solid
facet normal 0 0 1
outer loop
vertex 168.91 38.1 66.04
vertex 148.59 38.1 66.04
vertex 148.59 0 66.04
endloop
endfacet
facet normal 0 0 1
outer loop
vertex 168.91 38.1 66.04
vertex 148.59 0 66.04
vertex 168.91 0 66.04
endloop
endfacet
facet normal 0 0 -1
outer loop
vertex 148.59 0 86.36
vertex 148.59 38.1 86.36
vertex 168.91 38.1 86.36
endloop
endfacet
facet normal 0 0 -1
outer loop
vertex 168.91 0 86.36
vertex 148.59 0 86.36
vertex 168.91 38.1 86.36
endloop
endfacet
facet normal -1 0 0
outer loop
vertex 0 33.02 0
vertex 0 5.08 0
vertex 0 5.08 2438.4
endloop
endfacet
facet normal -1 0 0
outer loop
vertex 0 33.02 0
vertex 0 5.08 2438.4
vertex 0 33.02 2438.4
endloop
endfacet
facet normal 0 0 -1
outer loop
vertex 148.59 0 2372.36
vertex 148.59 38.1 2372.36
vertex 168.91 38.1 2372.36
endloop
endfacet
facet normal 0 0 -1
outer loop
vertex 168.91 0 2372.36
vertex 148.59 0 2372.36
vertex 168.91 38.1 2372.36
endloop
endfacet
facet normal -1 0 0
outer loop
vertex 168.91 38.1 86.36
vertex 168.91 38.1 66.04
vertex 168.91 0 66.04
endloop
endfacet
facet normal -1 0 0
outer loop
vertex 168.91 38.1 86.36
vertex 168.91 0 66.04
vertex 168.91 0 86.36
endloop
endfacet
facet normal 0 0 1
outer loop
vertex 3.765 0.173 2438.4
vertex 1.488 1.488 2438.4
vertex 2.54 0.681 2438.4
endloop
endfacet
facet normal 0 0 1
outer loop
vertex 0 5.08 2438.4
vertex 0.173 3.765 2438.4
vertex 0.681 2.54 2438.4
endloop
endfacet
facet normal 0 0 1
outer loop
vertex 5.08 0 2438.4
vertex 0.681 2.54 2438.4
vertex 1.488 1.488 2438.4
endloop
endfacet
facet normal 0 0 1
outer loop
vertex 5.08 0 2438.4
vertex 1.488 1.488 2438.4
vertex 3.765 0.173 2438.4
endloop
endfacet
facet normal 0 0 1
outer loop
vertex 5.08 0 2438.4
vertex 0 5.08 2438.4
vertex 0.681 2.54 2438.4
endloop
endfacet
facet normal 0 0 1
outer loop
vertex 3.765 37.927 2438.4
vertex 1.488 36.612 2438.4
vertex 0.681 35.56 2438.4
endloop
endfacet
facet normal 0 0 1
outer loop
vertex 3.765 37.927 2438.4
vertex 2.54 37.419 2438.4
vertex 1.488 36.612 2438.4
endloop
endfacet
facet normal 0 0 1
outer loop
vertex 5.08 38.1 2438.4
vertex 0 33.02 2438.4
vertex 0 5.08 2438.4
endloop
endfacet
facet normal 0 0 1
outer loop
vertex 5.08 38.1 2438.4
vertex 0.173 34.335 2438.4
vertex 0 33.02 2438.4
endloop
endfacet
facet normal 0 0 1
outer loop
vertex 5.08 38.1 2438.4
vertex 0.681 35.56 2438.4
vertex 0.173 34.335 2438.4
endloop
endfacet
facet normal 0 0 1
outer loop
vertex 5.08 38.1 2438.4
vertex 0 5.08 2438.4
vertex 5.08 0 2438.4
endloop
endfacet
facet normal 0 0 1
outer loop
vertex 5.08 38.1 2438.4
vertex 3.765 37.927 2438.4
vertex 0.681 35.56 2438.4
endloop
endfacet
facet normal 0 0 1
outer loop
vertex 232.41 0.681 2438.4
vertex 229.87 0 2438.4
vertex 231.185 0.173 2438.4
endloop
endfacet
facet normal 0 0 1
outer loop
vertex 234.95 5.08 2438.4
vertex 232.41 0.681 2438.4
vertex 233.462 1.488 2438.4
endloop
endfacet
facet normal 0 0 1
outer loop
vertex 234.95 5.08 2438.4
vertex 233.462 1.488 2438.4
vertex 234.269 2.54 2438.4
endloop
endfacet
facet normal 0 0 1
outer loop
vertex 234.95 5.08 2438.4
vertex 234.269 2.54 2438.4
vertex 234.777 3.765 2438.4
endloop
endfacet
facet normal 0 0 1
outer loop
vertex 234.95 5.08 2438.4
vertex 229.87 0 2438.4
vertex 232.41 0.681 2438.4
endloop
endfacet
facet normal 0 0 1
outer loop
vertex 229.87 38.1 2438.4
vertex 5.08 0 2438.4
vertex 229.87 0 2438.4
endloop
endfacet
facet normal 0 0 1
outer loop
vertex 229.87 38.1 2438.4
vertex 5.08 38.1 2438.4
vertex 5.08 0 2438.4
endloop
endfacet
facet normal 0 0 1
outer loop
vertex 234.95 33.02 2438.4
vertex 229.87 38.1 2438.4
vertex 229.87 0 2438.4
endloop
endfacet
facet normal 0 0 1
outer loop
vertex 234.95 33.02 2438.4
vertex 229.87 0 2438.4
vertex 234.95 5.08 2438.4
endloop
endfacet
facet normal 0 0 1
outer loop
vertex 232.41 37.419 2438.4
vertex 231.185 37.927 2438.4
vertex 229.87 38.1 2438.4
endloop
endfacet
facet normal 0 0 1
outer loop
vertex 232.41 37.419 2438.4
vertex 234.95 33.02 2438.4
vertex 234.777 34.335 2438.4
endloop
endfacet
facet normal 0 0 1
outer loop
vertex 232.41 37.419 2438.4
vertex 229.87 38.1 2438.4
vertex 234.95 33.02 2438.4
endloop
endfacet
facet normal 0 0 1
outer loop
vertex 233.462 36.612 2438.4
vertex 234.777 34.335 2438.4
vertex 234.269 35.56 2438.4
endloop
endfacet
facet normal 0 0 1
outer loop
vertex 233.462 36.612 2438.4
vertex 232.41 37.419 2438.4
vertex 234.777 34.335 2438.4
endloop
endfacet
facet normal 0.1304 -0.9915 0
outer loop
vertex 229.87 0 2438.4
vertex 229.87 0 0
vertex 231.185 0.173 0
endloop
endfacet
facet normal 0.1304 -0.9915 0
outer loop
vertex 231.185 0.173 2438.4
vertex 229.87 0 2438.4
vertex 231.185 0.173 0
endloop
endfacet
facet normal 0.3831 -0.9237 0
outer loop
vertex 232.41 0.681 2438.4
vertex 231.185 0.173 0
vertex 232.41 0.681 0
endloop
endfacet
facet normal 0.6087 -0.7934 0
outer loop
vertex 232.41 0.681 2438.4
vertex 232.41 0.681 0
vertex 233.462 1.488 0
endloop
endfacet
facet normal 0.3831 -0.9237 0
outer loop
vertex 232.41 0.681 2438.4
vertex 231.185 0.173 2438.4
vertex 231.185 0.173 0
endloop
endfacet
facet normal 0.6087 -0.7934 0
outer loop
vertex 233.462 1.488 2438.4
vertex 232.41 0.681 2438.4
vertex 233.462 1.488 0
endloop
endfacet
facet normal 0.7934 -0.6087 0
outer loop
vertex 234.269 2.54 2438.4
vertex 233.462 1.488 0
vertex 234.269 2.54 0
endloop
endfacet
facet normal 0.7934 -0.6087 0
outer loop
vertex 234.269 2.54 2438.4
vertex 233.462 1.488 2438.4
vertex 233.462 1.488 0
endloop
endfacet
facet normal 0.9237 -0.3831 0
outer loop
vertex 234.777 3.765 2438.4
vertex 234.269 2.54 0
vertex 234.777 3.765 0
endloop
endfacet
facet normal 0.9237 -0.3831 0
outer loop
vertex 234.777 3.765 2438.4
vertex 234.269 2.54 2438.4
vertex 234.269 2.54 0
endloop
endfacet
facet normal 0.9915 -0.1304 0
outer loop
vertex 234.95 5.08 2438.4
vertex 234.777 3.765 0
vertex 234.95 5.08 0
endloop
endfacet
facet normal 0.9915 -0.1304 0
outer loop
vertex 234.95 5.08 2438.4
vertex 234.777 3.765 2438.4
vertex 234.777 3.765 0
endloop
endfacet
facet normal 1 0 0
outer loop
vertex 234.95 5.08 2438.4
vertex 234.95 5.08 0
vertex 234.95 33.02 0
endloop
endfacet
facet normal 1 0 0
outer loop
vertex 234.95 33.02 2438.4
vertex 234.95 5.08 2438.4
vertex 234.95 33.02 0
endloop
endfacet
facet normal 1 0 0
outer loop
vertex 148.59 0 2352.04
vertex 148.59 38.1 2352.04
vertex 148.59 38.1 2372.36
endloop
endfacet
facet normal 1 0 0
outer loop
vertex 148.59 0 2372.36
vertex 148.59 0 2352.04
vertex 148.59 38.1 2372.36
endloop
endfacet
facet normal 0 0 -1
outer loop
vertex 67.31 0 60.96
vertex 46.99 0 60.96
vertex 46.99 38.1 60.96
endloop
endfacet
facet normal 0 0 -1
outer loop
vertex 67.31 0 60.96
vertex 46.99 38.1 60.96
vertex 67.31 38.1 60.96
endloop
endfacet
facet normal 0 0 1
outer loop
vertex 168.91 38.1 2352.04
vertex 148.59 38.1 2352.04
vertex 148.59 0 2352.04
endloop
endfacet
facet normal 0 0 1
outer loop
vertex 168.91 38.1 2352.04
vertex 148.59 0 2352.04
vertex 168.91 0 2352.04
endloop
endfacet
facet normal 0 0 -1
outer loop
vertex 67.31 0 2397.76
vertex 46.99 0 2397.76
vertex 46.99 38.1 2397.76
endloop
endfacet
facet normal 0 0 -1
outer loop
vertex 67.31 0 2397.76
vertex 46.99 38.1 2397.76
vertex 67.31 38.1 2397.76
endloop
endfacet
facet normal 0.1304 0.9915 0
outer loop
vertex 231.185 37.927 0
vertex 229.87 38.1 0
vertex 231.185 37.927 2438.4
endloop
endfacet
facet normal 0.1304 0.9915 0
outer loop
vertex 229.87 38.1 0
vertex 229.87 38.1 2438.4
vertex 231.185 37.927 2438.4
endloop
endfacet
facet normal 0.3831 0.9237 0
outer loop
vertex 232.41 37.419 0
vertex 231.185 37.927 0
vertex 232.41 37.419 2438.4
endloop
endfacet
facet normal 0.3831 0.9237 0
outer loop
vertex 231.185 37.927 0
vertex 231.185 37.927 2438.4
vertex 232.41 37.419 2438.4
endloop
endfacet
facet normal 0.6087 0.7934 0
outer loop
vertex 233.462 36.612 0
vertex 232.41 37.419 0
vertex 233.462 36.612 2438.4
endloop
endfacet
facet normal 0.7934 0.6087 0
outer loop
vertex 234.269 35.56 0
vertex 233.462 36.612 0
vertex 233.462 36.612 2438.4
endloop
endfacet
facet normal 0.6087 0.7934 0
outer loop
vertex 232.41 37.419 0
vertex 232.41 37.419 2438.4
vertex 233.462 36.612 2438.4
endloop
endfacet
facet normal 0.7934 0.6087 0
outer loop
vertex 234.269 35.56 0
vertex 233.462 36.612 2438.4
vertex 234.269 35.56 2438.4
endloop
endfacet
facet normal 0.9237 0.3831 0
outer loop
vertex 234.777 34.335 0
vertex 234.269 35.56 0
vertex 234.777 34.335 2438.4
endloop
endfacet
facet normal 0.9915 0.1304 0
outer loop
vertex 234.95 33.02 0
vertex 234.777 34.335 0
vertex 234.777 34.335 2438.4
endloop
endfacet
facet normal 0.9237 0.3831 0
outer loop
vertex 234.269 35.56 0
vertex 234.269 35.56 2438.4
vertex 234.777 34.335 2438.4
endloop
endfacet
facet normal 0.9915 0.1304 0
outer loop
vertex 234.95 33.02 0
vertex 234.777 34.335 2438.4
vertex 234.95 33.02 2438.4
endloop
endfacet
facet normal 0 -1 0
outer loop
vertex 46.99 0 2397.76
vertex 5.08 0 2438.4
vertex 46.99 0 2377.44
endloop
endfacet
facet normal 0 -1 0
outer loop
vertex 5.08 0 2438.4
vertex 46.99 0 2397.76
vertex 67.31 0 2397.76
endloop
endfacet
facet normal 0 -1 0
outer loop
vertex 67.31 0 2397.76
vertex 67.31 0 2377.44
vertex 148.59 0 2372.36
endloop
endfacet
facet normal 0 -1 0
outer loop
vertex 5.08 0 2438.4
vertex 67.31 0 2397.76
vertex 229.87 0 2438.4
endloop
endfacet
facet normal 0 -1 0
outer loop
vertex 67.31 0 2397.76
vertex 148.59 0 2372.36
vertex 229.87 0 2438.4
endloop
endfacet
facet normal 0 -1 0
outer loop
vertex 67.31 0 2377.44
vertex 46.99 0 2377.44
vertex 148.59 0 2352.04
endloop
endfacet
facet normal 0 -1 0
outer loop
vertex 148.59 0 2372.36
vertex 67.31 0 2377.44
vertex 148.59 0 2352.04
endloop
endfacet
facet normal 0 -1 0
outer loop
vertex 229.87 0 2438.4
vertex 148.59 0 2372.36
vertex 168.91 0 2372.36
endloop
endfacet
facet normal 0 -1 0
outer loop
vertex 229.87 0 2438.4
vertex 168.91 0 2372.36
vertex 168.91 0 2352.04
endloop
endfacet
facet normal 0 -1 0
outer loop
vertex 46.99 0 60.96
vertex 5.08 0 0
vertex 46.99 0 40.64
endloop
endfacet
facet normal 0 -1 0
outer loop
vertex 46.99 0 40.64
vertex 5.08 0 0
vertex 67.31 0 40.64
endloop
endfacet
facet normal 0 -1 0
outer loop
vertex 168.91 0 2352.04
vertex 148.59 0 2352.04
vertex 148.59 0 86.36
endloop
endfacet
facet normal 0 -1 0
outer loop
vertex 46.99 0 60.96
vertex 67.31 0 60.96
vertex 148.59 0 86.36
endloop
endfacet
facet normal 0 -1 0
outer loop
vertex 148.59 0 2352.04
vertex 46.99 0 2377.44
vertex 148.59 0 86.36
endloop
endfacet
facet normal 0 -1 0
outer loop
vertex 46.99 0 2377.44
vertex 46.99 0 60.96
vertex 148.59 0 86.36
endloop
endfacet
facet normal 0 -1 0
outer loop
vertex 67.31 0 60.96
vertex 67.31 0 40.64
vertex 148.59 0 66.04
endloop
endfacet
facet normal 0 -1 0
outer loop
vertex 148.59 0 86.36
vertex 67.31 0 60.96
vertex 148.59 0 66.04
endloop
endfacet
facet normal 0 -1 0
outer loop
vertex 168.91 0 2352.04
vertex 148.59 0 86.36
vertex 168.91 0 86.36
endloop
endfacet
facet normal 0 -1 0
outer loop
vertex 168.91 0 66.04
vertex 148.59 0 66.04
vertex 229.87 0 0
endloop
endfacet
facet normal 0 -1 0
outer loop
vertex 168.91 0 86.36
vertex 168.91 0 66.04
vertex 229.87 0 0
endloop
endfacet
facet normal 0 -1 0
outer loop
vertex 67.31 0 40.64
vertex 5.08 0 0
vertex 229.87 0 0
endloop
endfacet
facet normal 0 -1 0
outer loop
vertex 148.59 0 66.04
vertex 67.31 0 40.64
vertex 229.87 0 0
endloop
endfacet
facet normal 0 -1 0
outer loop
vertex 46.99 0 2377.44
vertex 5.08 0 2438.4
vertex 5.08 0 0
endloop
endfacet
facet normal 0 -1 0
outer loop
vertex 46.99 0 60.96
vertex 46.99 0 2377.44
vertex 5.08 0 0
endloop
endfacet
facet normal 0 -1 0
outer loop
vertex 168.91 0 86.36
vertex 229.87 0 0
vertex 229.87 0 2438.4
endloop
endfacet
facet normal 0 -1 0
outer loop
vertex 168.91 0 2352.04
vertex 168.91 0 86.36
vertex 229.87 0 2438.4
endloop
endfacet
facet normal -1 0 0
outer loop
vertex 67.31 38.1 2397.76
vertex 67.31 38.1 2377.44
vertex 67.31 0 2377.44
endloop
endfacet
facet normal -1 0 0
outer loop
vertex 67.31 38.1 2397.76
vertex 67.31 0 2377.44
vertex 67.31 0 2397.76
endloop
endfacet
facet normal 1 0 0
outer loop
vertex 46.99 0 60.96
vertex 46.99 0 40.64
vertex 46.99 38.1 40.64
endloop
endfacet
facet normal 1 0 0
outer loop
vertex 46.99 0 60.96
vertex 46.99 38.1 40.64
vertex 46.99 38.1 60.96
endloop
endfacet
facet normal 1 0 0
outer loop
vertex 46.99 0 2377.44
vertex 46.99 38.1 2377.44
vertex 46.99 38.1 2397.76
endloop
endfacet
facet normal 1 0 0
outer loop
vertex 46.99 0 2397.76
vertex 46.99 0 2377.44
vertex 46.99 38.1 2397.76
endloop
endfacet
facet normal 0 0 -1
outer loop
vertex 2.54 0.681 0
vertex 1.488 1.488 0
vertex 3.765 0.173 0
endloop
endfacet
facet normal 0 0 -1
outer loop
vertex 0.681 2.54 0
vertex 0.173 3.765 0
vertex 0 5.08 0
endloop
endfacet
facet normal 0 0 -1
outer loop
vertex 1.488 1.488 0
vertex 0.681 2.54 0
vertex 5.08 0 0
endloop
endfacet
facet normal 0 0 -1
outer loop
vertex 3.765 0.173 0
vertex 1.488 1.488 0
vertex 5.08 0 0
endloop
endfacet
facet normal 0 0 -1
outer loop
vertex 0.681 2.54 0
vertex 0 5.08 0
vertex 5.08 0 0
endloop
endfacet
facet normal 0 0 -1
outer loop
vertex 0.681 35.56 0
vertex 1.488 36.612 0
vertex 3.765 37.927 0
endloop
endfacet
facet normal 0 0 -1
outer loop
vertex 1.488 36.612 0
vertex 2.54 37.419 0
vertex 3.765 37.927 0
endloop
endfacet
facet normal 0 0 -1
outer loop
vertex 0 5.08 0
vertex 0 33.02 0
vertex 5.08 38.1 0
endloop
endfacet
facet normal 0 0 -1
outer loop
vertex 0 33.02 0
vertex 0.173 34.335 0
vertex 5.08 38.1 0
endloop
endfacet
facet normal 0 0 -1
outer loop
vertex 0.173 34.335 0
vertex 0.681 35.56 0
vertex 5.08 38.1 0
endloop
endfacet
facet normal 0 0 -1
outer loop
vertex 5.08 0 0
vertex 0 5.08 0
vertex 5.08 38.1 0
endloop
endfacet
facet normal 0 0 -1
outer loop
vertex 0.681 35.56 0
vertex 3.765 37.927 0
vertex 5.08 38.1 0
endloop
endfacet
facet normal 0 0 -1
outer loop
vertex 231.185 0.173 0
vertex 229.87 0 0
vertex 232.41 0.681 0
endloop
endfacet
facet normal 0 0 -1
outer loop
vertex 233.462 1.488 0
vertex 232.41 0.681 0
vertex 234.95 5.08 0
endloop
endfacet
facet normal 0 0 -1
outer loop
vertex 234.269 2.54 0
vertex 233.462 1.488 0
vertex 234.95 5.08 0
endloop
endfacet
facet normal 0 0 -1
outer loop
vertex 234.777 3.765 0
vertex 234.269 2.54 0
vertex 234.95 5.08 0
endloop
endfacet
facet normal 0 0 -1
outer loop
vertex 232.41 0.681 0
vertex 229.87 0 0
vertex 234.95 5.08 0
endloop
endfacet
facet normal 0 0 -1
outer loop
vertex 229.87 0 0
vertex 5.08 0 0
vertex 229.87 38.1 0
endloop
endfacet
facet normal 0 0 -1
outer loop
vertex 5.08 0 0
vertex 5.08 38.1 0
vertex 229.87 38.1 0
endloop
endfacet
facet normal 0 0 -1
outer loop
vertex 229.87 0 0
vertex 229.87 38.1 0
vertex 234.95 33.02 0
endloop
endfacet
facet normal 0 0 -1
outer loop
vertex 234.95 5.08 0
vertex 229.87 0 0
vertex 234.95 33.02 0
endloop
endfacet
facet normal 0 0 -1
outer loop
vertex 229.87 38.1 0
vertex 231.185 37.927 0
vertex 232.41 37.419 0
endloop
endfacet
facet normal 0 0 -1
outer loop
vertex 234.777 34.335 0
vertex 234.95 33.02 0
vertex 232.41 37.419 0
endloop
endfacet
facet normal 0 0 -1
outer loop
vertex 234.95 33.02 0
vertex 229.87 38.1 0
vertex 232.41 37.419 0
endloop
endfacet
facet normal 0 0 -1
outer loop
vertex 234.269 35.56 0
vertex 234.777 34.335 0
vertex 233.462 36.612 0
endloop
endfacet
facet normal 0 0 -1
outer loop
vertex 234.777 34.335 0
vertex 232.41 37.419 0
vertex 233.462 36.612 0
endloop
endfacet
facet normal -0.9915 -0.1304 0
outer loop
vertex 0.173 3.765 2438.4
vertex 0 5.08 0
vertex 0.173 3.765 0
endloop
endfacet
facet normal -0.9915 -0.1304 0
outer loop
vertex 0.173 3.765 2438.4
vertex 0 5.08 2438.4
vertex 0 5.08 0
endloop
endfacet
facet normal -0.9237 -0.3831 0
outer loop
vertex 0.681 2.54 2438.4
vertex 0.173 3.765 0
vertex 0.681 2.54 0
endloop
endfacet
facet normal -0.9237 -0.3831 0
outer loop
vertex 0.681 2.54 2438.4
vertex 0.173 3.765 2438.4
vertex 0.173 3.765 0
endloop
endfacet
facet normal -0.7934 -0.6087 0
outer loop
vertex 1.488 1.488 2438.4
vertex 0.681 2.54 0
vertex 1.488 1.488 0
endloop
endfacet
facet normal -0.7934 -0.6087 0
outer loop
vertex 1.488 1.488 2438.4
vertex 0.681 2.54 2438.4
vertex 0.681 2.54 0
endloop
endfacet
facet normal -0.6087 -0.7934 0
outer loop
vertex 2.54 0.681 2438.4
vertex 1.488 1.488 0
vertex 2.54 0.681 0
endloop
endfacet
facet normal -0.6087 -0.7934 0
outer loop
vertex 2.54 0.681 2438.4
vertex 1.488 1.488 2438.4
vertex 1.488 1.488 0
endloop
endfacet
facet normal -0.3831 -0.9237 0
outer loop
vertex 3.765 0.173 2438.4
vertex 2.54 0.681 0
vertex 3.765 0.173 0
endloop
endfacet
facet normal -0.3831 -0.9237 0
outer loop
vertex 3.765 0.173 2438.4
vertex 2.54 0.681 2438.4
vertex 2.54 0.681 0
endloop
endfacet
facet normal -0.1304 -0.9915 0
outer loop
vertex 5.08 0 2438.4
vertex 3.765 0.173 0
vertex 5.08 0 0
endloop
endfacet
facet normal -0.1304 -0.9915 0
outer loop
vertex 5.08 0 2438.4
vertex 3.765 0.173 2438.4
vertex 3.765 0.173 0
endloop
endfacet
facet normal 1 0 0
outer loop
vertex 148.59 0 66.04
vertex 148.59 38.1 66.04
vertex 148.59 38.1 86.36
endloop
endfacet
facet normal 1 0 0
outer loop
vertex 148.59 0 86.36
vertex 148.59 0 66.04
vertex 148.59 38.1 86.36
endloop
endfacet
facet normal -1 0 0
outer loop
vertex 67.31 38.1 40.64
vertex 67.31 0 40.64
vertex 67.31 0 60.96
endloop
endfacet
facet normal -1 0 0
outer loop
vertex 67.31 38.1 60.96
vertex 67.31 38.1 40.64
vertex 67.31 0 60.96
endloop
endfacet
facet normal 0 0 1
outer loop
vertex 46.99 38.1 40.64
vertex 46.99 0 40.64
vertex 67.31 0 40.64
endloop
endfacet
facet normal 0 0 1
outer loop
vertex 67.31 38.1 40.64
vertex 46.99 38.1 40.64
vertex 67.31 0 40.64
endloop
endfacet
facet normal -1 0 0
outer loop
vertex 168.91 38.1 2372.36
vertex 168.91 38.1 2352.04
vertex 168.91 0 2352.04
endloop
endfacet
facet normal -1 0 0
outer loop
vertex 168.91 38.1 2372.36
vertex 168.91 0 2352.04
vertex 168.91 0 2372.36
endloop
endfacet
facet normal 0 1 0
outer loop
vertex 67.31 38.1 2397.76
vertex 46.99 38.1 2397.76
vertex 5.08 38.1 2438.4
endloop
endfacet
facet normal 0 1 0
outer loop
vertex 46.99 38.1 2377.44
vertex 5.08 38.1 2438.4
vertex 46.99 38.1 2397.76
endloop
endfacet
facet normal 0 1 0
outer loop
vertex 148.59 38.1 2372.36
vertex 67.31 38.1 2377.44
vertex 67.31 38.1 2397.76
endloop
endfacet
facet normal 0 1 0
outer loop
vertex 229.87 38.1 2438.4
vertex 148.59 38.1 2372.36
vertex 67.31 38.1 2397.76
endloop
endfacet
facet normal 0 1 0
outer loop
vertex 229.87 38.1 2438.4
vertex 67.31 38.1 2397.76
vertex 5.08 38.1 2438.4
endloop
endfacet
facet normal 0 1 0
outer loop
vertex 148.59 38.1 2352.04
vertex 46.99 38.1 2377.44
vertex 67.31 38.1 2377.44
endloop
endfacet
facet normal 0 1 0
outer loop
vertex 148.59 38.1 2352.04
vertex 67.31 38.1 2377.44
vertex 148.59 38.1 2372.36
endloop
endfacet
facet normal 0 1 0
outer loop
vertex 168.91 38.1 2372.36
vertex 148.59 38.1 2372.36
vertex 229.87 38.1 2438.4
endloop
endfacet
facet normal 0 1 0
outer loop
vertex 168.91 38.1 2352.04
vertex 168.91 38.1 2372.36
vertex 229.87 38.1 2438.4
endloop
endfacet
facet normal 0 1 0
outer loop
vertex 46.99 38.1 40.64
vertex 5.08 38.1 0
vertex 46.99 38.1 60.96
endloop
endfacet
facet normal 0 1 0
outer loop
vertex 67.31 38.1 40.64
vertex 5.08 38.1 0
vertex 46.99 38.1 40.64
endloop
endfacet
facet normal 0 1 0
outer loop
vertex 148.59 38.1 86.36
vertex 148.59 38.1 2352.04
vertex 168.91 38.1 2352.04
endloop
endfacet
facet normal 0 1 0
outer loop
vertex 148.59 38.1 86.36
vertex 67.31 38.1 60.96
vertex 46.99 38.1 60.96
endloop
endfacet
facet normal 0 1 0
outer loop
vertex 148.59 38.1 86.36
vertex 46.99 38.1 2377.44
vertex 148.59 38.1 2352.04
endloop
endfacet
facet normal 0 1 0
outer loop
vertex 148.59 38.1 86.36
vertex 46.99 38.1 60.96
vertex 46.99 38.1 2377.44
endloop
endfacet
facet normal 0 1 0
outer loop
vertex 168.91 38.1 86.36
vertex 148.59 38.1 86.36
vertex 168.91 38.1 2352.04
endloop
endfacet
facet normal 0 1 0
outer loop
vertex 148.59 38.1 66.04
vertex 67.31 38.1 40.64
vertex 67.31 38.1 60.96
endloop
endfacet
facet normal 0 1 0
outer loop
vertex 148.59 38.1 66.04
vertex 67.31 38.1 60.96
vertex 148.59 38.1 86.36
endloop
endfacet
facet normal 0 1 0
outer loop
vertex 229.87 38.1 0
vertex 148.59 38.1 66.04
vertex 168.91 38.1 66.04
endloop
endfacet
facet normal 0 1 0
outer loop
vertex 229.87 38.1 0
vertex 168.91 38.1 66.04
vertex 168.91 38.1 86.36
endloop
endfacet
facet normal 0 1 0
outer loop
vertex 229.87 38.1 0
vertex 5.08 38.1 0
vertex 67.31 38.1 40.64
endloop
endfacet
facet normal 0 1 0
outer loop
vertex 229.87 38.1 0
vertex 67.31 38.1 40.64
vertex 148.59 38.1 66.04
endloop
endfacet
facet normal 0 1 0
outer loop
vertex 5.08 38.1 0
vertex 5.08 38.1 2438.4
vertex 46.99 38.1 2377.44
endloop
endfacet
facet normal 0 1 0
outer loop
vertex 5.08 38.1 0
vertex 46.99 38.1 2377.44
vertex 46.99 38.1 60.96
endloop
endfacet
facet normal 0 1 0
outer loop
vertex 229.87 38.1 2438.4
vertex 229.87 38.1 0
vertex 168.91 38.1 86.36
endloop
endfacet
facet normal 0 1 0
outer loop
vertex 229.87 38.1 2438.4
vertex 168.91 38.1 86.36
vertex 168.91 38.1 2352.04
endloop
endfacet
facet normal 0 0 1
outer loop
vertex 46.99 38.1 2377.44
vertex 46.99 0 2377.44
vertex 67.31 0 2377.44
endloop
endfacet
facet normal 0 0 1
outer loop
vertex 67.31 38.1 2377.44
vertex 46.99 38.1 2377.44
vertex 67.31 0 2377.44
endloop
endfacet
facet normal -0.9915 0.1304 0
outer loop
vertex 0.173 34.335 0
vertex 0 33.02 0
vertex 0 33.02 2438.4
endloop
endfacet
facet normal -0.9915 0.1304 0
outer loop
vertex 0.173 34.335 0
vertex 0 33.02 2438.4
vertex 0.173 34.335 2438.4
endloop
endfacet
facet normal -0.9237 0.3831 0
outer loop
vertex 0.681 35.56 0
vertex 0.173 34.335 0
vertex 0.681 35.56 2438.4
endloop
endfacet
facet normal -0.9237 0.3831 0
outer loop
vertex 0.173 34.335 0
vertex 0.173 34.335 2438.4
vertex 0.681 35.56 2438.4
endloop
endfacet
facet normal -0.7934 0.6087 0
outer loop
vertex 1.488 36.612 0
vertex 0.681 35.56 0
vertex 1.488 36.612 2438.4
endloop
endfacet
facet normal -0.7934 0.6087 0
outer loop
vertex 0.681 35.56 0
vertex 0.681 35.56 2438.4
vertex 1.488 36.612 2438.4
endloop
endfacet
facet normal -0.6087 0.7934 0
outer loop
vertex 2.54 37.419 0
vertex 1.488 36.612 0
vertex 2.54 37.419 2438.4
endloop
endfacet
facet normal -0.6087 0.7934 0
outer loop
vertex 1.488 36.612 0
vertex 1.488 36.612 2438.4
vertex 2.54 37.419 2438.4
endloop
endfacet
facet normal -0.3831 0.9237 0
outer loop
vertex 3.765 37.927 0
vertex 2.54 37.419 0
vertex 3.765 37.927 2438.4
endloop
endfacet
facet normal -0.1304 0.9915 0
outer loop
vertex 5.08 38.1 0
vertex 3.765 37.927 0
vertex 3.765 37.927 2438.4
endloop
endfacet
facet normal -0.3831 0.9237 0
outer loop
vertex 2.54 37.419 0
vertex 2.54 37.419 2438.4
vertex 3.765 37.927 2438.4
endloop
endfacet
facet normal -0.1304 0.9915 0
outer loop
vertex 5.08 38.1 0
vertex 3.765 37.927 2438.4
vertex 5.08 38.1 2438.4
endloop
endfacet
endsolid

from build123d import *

# Parameters (mm, degrees)
F0_W     = 234.95
F0_H     = 38.1
F1_DEPTH = 2438.4
F2_W     = 20.32
F2_H     = 20.32
F3_DEPTH = 50.8
F4_R     = 5.08


with BuildPart() as f1:
    # F0 (on Top) → F1 (new body)
    with BuildSketch(Plane.XY):
        with Locations((117.475, 19.05)):
            Rectangle(F0_W, F0_H)
    extrude(amount=F1_DEPTH)

    # F2 (on face) → F3 (cut)
    with BuildSketch(Plane.XZ):
        with Locations((57.15, 2387.6)):
            Rectangle(F2_W, F2_H)
        with Locations((158.75, 2362.2)):
            Rectangle(F2_W, F2_H)
        with Locations((158.75, 76.2)):
            Rectangle(F2_W, F2_H)
        with Locations((57.15, 50.8)):
            Rectangle(F2_W, F2_H)
    extrude(amount=-F3_DEPTH, mode=Mode.SUBTRACT)

    # F4
    f4_edges = [f1.edges().sort_by_distance(p)[0] for p in [
        (0, 0, 1219.2),
        (234.95, 0, 1219.2),
        (0, 38.1, 1219.2),
        (234.95, 38.1, 1219.2),
    ]]
    fillet(f4_edges, radius=F4_R)


solid = f1.part
